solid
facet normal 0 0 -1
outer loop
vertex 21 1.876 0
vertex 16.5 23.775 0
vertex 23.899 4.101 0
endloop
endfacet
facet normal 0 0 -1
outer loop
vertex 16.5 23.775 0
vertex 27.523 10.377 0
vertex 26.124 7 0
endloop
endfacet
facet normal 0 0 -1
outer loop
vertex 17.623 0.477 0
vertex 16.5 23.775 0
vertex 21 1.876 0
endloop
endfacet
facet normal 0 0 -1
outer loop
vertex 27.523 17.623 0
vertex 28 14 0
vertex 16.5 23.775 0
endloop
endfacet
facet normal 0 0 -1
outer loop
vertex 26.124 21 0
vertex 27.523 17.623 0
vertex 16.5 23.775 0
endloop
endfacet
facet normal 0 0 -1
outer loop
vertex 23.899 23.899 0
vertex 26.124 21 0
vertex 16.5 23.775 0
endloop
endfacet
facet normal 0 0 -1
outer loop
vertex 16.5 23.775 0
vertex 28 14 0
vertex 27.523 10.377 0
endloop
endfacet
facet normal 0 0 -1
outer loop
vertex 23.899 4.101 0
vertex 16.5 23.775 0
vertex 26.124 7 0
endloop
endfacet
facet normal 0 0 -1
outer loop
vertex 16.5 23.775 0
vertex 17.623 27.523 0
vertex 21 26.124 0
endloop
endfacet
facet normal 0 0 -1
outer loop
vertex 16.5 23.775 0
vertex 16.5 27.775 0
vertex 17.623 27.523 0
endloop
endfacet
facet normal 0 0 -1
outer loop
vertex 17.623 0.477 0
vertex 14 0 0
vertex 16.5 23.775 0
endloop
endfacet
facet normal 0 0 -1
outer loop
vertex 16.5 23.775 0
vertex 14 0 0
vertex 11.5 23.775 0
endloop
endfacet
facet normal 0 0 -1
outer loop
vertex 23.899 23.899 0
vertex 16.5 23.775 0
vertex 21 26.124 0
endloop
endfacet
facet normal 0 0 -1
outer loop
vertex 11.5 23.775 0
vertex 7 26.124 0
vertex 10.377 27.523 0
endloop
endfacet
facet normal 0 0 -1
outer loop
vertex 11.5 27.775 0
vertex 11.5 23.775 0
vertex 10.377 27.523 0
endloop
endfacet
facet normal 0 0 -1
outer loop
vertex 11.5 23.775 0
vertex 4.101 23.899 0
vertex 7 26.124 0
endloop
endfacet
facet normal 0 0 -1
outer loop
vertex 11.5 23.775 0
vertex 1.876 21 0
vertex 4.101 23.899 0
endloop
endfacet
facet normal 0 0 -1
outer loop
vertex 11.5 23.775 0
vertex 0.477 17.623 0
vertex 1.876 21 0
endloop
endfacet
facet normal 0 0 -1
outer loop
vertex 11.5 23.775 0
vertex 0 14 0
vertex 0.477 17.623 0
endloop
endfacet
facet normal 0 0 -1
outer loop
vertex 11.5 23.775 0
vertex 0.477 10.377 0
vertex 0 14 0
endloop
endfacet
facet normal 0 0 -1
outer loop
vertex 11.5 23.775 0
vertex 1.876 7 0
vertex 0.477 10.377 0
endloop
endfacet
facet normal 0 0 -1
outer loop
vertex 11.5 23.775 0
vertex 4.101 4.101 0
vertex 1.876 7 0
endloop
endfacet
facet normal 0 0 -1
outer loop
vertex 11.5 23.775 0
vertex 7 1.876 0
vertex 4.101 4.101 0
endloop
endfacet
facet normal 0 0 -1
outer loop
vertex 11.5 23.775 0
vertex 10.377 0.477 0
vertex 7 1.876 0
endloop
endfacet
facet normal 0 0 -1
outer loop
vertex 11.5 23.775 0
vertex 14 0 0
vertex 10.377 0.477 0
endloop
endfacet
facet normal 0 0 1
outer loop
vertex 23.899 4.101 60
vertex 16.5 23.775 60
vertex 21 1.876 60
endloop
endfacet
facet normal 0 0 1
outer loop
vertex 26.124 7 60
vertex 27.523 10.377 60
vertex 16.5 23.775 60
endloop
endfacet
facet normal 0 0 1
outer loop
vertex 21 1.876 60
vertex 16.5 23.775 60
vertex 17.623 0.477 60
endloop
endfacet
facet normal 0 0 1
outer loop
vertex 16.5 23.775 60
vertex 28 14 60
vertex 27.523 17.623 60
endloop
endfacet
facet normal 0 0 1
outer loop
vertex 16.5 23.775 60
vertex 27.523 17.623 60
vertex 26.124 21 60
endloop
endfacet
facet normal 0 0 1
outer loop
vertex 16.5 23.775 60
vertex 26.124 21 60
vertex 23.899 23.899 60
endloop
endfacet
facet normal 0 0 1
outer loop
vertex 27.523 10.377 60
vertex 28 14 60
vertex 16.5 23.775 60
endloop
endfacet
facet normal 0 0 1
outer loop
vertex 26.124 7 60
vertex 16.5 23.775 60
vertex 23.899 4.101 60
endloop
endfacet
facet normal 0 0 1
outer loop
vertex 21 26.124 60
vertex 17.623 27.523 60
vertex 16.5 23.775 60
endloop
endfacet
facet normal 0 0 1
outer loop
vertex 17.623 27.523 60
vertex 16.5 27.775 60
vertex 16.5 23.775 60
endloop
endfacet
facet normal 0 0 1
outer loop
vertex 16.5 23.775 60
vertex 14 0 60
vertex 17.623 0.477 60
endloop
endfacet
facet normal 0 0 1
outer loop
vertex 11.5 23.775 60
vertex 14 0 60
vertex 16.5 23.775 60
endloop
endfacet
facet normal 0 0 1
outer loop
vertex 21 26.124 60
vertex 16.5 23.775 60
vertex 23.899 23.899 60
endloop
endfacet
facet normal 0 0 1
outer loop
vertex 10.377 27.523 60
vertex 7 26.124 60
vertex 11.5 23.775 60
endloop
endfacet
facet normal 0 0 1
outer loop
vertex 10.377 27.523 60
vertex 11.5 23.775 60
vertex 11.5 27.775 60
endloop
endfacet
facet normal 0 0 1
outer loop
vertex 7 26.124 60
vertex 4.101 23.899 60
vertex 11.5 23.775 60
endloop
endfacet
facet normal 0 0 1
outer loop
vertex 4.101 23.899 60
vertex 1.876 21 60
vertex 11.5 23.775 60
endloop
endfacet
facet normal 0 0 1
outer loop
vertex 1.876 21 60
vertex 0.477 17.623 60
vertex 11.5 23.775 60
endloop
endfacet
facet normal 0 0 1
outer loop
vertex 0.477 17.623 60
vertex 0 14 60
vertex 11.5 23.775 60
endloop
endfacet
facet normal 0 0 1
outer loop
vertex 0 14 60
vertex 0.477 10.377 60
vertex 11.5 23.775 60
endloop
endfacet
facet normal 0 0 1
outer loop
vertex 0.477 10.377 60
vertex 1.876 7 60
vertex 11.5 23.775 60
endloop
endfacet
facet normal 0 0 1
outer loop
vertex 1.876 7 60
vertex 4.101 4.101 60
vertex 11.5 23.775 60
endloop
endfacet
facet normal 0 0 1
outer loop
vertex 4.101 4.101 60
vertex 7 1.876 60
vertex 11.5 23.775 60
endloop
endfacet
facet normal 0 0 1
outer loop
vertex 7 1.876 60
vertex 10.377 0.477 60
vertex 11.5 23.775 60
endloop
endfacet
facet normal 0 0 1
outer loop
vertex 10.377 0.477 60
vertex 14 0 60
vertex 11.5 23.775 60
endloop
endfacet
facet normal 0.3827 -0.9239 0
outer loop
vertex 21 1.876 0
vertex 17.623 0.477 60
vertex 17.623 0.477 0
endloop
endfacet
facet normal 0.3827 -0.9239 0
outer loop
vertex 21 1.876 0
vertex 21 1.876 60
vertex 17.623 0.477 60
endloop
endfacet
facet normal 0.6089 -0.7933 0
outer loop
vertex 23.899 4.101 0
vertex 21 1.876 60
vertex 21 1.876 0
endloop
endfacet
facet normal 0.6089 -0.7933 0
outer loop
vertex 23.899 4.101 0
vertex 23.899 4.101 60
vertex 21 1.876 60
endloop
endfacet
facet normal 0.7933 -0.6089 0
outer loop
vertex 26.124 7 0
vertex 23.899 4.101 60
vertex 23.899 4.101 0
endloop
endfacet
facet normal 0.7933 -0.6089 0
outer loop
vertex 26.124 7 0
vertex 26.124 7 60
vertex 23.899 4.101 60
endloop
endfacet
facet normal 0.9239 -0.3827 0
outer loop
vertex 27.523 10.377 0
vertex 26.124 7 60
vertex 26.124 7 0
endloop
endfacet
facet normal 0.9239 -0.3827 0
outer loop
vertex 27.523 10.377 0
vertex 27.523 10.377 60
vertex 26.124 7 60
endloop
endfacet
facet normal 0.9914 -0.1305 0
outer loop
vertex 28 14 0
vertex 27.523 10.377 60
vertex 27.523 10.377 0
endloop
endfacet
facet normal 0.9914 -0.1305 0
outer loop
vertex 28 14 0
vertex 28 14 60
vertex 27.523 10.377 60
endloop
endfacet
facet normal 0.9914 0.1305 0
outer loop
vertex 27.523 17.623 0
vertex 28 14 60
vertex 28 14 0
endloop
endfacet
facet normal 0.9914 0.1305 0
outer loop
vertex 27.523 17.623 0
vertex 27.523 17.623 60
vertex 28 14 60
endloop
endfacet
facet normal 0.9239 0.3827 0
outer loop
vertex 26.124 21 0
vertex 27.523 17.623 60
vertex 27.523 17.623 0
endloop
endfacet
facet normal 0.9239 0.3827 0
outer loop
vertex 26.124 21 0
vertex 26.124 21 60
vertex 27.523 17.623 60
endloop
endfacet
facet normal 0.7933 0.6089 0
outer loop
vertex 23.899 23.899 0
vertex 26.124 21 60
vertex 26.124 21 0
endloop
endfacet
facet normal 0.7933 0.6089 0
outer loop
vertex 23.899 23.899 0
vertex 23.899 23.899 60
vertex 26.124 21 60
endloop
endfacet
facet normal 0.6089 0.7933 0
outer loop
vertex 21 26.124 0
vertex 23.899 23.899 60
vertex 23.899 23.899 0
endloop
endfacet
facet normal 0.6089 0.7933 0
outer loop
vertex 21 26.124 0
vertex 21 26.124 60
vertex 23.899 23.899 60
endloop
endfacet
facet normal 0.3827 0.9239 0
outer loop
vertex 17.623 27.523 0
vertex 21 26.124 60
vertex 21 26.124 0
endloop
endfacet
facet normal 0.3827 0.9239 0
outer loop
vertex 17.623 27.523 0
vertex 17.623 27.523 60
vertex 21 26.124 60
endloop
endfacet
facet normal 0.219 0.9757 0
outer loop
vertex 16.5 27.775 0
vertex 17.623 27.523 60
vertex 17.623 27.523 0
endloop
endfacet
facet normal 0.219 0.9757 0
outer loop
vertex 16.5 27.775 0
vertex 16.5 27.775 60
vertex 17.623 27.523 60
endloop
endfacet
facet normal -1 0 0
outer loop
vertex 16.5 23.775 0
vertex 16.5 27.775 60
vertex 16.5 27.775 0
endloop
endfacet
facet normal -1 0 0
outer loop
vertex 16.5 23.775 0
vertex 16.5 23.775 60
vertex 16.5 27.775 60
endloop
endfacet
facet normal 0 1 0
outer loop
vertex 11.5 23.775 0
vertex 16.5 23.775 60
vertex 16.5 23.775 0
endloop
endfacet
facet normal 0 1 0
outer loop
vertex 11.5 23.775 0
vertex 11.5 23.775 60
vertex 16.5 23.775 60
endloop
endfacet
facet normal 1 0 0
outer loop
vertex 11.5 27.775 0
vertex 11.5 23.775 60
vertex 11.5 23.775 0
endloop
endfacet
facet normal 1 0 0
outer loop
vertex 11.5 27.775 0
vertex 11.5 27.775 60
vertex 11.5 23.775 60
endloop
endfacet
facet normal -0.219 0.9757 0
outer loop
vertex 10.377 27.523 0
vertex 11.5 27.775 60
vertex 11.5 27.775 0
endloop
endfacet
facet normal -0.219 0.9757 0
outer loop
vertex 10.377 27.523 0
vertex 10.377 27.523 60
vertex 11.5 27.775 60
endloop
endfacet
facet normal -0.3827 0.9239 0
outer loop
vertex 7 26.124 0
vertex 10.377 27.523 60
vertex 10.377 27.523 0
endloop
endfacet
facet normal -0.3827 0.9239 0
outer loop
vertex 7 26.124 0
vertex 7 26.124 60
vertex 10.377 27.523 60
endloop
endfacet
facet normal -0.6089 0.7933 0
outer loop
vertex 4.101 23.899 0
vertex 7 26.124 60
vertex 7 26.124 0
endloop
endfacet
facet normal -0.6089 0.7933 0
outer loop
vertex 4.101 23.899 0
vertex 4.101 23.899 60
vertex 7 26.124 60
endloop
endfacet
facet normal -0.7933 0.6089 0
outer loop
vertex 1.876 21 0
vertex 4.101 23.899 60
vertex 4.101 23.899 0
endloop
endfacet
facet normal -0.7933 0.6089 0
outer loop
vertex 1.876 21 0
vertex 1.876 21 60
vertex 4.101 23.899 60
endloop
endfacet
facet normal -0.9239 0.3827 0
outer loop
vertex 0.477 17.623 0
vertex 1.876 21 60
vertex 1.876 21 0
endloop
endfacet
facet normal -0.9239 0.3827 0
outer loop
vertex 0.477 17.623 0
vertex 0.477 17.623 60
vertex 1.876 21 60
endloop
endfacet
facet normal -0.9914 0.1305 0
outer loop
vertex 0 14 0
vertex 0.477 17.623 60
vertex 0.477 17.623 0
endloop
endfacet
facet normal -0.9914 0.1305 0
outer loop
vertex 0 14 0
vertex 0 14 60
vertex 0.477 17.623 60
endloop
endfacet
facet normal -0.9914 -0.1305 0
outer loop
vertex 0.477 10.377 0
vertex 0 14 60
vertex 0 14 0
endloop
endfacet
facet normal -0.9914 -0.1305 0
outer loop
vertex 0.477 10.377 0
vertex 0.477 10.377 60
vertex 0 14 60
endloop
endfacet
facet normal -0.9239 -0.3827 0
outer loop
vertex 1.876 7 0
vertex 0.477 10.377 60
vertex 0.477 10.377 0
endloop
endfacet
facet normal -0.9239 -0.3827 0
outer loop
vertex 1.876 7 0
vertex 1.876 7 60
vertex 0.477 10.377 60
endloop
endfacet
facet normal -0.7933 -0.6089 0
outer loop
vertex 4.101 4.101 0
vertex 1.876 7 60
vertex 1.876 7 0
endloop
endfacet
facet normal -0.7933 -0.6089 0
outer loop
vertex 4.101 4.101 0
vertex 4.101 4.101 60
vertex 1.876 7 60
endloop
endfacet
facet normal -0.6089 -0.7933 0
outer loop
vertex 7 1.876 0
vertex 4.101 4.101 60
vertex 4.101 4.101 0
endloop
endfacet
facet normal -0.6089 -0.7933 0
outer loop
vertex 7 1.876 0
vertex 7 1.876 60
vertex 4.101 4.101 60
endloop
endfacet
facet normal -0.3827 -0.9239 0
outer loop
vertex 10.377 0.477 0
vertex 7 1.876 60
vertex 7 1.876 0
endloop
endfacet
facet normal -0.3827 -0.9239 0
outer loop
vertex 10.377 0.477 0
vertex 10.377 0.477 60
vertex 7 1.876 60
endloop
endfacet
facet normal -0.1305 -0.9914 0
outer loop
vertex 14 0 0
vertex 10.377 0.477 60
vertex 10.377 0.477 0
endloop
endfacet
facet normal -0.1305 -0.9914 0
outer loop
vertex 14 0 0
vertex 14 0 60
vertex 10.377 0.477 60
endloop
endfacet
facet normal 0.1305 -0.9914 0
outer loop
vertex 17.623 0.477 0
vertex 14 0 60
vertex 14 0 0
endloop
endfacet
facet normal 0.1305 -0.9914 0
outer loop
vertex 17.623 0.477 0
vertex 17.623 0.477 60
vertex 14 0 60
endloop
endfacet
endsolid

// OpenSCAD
$fn = 32;

// ----------------------------------------------------------------------
// Keyway shaft: d28 shaft, key 5 x 4 mm
// ----------------------------------------------------------------------

// --- parameters (mm) ---
shaft_r = 14;             // shaft radius
key_w = 5;                // keyway width
key_d = 4;                // keyway depth below the surface line
plate_t = 60;             // shaft length, Z (extrusion height)
fit_tol = 0.1;            // declared fit tolerance (prompt contract)
free_tol = 0.3;           // declared free tolerance (prompt contract)

shaft_d = 2 * shaft_r;  // shaft diameter
circle_step = 15;  // polygon sampling step, degrees

profile = [[10.377, 27.523], [7, 26.124], [4.101, 23.899], [1.876, 21], [0.477, 17.623], [0, 14], [0.477, 10.377], [1.876, 7], [4.101, 4.101], [7, 1.876], [10.377, 0.477], [14, 0], [17.623, 0.477], [21, 1.876], [23.899, 4.101], [26.124, 7], [27.523, 10.377], [28, 14], [27.523, 17.623], [26.124, 21], [23.899, 23.899], [21, 26.124], [17.623, 27.523], [16.5, 27.775], [16.5, 23.775], [11.5, 23.775], [11.5, 27.775]];  // primary outline, 27 points, counter clockwise

// --- the one profile operation ---
linear_extrude(height = plate_t) polygon(points = profile);
